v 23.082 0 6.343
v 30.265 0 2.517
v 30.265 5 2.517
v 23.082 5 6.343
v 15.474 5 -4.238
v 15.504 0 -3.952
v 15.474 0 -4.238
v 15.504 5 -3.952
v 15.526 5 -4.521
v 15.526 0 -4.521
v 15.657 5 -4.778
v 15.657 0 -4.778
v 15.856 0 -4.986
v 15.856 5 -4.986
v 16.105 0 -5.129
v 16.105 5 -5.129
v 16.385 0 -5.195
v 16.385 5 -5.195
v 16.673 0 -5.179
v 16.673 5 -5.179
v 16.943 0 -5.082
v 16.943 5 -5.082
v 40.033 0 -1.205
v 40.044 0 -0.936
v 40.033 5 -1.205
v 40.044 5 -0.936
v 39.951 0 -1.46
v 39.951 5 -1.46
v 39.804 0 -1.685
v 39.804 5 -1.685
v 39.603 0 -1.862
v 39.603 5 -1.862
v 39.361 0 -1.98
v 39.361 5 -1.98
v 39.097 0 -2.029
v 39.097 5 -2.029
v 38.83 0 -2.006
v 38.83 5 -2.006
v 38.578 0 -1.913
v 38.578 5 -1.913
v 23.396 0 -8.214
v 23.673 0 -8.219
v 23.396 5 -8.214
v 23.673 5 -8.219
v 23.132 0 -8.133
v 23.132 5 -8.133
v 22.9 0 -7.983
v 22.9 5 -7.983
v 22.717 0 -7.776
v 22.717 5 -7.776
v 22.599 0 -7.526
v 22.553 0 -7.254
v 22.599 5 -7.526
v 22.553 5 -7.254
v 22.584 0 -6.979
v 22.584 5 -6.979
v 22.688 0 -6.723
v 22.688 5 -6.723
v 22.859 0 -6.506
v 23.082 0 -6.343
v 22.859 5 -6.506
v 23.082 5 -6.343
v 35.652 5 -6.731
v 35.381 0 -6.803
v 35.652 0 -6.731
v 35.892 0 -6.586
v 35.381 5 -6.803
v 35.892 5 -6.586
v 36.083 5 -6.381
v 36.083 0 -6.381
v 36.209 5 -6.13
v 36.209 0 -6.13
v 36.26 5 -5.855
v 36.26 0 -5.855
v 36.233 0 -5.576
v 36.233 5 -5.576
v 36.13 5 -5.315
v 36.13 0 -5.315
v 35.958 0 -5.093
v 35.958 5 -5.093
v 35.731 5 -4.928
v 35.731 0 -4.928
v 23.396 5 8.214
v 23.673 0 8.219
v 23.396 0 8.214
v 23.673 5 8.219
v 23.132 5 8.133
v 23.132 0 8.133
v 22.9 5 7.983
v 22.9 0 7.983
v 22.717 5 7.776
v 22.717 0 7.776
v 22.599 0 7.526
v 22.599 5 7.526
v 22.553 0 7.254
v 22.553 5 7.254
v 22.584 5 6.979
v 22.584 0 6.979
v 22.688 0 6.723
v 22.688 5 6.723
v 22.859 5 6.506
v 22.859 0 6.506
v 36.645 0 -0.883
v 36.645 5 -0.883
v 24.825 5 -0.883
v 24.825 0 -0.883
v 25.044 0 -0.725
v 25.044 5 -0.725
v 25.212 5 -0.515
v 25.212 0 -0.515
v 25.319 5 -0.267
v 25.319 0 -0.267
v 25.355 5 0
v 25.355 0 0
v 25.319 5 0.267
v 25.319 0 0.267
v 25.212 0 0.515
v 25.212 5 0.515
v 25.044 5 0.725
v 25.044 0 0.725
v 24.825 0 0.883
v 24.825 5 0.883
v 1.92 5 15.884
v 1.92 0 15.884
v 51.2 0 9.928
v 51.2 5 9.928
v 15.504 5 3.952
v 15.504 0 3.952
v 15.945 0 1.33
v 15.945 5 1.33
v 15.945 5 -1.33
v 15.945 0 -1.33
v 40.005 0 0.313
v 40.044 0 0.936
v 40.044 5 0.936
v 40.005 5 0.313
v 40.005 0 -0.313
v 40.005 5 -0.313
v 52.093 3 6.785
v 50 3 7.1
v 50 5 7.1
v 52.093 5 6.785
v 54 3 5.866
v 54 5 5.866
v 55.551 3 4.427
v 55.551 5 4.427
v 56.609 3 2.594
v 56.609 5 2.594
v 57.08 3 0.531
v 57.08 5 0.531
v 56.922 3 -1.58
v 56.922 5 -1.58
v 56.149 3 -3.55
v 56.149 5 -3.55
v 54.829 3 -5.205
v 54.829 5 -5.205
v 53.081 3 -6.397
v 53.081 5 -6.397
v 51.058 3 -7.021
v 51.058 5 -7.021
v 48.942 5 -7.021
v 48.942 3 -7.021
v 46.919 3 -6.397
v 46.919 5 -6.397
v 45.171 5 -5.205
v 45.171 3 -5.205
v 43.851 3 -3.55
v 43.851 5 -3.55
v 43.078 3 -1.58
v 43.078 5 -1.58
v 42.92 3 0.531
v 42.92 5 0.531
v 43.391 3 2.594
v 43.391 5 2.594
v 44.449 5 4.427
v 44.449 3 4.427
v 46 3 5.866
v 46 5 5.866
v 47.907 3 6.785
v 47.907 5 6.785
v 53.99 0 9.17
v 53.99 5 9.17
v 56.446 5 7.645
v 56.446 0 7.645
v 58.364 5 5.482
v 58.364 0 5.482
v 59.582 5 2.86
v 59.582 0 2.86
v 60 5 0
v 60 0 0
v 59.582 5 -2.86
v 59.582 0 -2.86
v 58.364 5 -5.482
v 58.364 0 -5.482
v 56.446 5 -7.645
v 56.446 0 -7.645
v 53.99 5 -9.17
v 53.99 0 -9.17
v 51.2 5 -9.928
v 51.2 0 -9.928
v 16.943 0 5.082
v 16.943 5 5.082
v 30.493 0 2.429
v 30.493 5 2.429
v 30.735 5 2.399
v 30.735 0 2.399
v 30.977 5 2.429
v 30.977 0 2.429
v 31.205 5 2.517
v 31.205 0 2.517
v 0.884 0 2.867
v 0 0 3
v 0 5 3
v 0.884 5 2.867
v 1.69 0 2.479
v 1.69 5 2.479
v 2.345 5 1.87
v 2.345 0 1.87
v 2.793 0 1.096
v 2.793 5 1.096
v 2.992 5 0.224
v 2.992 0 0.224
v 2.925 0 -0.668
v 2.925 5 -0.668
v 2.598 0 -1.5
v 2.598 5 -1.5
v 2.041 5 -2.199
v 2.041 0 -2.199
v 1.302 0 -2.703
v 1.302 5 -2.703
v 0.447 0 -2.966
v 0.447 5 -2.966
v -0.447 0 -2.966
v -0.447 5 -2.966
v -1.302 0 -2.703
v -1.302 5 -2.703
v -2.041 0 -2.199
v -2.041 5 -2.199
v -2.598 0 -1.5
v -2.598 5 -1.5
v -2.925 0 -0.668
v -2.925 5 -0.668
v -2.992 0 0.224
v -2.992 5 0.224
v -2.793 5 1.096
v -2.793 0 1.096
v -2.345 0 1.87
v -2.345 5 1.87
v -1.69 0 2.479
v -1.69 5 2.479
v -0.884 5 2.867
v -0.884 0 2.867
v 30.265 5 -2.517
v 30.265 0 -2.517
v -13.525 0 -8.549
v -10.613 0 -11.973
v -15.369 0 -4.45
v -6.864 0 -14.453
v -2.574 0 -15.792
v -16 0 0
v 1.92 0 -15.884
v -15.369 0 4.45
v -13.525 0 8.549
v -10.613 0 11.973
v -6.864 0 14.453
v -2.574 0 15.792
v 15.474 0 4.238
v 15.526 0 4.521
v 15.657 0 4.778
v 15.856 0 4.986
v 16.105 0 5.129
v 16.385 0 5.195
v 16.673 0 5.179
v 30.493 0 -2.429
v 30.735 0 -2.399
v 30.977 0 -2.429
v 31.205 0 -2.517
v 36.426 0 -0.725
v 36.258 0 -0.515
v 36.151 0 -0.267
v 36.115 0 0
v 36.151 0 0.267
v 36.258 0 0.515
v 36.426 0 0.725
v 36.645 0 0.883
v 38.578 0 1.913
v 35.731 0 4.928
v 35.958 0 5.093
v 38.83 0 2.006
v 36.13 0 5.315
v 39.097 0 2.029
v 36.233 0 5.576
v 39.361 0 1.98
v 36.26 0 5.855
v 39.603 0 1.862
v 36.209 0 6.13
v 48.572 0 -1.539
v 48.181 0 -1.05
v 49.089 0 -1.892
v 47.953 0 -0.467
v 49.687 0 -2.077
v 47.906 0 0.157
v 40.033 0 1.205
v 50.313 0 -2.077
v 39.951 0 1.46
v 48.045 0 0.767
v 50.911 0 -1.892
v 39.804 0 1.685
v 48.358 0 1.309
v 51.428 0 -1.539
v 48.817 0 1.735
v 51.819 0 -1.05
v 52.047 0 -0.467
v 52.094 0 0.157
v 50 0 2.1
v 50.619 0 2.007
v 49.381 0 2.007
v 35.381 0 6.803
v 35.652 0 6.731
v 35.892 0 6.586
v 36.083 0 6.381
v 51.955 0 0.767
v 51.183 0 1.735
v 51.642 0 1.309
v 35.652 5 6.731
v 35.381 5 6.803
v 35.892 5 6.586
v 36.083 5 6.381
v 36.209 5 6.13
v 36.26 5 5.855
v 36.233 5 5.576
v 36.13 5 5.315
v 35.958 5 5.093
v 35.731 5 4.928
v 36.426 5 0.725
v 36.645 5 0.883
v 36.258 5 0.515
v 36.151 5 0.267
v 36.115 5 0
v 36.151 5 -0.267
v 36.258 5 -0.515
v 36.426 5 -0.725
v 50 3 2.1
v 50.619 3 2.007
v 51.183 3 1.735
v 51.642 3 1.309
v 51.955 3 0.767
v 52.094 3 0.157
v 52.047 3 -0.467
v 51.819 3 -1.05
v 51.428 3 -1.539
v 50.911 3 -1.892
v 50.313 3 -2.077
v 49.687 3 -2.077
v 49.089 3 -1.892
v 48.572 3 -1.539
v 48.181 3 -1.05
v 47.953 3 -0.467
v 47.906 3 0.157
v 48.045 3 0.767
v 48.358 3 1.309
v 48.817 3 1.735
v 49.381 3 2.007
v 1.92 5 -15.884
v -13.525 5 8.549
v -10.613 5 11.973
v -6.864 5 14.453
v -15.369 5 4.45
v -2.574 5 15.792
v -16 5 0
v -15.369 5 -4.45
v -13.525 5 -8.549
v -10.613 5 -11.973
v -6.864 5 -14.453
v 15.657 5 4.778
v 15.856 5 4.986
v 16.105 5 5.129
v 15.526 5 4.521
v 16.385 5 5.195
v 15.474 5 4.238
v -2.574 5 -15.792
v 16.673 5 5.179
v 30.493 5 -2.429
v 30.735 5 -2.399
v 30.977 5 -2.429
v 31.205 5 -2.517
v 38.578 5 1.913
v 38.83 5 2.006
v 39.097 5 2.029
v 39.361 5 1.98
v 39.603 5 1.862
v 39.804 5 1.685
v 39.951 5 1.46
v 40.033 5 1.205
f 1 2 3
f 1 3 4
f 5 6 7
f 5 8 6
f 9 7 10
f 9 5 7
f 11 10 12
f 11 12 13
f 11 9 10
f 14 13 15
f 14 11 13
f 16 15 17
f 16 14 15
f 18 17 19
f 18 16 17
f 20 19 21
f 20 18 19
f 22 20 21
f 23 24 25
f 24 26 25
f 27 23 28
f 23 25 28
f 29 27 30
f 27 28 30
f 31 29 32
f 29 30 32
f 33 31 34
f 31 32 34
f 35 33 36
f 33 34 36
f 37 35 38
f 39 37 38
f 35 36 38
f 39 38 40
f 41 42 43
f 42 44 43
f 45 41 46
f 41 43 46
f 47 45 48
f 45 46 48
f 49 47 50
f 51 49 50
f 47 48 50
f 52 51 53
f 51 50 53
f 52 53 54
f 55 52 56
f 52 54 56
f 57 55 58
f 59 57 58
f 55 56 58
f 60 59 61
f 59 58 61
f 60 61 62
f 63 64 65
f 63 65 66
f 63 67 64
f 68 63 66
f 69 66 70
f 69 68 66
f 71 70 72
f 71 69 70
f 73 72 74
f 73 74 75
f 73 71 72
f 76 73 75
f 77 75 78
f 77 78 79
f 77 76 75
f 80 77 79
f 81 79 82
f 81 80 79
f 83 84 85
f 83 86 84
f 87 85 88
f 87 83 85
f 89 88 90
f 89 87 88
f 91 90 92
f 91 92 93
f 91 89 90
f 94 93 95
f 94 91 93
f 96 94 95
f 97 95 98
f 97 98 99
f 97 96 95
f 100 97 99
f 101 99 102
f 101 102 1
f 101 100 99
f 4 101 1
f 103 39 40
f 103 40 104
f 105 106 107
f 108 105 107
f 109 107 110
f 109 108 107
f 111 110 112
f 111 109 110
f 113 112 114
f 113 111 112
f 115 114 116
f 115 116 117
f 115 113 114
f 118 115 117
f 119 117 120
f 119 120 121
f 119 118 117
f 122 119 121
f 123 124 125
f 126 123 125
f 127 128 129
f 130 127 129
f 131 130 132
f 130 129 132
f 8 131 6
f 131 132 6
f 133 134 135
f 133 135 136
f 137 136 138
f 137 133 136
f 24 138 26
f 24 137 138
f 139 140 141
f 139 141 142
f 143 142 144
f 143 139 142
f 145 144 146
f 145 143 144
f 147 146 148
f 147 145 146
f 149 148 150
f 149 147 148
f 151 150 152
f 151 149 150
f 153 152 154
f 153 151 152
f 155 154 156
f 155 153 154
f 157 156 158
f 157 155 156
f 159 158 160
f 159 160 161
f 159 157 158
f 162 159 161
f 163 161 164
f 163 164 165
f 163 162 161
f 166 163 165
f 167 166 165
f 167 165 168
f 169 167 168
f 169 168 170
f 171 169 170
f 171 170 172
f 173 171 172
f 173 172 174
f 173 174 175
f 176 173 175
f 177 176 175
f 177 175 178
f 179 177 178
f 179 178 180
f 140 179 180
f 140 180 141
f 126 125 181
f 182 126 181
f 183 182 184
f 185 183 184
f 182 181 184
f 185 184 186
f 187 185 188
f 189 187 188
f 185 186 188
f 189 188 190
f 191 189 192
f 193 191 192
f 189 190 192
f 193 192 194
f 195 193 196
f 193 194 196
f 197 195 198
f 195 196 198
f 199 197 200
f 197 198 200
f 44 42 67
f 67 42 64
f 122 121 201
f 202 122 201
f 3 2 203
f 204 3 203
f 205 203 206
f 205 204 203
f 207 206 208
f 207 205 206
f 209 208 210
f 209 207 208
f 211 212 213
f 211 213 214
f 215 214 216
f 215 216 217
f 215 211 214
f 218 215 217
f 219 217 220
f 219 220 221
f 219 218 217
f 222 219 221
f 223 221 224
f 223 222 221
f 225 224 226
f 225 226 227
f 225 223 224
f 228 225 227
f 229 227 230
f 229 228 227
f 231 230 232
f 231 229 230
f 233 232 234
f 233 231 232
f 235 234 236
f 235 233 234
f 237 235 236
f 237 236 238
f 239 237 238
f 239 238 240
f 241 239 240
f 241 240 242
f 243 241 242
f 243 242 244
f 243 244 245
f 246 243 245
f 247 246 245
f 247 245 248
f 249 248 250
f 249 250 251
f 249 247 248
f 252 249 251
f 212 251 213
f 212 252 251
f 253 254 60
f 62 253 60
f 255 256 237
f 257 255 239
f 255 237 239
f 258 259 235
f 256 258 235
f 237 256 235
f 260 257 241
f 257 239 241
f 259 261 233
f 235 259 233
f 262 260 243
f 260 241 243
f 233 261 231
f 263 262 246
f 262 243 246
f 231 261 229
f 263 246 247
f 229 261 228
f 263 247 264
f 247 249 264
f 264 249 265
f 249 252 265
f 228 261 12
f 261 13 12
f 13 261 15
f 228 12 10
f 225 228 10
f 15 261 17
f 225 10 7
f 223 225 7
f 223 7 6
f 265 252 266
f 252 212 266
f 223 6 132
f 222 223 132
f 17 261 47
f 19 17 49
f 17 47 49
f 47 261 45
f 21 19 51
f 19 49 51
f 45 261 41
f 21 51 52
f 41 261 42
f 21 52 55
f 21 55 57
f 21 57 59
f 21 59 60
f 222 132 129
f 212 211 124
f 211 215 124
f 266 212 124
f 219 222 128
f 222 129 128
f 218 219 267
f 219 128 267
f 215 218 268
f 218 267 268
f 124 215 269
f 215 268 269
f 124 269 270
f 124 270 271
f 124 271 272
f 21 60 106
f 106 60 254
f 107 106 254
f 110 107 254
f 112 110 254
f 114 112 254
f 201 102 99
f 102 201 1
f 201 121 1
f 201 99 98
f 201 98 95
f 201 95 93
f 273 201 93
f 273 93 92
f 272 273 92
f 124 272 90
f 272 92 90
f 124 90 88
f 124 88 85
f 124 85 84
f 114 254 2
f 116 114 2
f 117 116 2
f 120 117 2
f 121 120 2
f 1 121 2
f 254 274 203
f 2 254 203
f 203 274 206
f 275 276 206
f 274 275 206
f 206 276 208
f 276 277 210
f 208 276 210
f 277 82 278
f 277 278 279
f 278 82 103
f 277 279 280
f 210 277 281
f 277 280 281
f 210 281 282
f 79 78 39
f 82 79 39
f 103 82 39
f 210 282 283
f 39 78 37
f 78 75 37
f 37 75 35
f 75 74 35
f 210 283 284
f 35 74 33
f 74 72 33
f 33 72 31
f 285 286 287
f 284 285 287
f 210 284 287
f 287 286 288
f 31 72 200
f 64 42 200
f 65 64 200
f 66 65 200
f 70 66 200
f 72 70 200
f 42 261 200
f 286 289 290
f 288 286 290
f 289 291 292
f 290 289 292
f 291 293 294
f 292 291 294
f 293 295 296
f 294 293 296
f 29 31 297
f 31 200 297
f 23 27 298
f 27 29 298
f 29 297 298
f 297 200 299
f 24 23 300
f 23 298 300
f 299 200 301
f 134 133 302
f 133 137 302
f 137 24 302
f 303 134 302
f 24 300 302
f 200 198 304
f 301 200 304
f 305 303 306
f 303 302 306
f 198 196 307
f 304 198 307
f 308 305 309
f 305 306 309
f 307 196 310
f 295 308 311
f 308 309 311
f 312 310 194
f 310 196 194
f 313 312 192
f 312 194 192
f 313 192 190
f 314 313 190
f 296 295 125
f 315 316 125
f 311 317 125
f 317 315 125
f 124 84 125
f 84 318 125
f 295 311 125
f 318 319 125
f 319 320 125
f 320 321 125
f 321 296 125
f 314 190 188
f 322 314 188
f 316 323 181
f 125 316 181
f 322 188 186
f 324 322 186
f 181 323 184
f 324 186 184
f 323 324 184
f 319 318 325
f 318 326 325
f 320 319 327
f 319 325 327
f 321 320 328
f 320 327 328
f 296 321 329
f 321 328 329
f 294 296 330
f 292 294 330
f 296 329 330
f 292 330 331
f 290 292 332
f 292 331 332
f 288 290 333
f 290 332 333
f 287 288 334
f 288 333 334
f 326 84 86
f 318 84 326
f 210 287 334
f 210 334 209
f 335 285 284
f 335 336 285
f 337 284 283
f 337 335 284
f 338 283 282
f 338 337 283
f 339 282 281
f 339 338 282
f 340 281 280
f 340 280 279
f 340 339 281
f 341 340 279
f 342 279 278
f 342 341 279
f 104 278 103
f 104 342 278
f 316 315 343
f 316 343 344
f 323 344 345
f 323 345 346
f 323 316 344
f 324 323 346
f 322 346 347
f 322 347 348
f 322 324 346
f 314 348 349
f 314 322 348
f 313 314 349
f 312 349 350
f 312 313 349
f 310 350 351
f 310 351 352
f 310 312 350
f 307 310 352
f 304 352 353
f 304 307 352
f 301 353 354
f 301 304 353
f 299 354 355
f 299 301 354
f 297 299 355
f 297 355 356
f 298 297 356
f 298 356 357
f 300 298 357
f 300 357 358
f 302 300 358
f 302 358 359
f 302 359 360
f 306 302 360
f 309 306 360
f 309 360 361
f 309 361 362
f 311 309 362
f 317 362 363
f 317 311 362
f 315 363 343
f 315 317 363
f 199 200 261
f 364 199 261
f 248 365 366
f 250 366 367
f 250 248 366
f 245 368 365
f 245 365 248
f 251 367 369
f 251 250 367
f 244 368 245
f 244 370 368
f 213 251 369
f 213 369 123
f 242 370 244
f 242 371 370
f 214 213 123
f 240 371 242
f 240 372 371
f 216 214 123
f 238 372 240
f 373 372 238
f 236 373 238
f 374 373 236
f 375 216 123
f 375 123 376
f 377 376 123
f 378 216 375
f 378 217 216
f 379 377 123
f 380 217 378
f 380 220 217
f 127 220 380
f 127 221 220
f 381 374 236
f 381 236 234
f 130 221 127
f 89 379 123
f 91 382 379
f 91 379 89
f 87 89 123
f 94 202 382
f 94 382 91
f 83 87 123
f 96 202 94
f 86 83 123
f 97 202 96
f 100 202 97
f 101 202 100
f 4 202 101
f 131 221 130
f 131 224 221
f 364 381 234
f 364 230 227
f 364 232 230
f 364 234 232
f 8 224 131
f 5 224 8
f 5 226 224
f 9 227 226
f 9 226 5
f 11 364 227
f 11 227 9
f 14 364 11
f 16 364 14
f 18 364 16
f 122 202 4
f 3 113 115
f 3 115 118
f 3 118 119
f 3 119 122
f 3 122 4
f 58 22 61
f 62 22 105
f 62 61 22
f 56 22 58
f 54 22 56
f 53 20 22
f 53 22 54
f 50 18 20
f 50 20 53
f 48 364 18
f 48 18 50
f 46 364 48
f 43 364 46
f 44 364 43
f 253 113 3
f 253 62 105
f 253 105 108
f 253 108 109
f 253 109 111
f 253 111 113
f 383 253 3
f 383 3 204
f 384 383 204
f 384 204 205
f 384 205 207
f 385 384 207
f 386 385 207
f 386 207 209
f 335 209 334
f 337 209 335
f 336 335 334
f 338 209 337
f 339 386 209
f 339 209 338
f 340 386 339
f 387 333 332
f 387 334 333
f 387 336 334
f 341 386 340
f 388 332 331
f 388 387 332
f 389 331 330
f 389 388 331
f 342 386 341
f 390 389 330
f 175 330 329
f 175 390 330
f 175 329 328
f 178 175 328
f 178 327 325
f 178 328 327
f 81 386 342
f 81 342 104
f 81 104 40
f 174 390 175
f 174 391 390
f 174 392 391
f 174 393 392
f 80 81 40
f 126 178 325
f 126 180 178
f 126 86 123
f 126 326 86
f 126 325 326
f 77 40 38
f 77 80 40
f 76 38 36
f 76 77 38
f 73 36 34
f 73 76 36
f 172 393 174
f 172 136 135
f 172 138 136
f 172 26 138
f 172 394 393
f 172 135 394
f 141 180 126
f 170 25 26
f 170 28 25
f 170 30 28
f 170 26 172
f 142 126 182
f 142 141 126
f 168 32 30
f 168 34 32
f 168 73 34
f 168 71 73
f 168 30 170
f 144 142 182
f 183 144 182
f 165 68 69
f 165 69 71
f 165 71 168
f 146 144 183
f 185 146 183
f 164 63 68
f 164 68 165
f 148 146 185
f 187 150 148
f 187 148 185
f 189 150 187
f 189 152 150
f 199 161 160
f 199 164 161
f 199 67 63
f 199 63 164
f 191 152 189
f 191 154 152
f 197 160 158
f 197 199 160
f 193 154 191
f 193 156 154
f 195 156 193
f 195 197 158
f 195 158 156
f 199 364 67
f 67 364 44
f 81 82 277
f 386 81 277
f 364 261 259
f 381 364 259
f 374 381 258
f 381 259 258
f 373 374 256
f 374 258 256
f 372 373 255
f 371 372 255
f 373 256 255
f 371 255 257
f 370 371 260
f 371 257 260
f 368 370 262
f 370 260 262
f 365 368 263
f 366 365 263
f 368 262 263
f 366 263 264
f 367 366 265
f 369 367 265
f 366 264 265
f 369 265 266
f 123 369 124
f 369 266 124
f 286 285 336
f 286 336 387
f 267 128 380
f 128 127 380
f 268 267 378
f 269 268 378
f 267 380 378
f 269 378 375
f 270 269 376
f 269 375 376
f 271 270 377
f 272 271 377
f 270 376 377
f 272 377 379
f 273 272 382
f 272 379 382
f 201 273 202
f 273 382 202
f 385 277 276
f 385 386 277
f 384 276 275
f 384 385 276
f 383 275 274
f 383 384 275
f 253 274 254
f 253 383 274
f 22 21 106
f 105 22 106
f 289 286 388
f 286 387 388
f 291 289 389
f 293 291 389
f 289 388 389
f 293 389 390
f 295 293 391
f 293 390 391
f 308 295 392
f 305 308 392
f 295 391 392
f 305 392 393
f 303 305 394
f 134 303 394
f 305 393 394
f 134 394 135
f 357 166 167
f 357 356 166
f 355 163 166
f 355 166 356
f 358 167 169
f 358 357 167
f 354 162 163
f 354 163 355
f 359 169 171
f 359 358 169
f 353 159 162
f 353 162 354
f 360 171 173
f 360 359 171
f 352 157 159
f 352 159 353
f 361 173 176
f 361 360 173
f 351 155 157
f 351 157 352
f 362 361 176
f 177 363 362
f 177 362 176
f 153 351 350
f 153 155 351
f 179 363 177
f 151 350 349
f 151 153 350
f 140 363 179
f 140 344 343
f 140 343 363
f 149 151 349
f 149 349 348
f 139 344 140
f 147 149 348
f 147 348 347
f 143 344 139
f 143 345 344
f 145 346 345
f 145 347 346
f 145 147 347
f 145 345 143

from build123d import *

# Parameters (mm, degrees)
SKETCH_1_R      = 3
SKETCH_1_R_2    = 7.1
EXTRUDE_1_DEPTH = 5
SKETCH_1_3_R    = 7.1
SKETCH_1_3_R_2  = 2.1
EXTRUDE_2_DEPTH = 3
FILLET_1_R      = 1
FILLET_2_R      = 1
FILLET_3_R      = 1
FILLET_4_R      = 1


with BuildPart() as part:
    # 草图1 → 凸台-拉伸1 (new body)
    with BuildSketch(Plane(origin=(0, 0, 0), x_dir=(1, 0, 0), z_dir=(0, 1, 0))):
        with BuildLine():
            ThreePointArc((1.92, 15.884382267), (-16, 0), (1.92, -15.884382267))
            Line((1.92, -15.884382267), (51.2, -9.927738917))
            ThreePointArc((51.2, -9.927738917), (60, 0), (51.2, 9.927738917))
            Line((51.2, 9.927738917), (1.92, 15.884382267))
        make_face()
        Circle(SKETCH_1_R, mode=Mode.SUBTRACT)
        Polygon((38.535462938, -6.422151611), (18.356508588, -8.861251331), (30.734984007, -2.266153232), align=None, mode=Mode.SUBTRACT)
        with BuildLine():
            Line((40.429404433, -2.898913674), (34.988373668, 0))
            Line((34.988373668, 0), (40.429404433, 2.898913674))
            ThreePointArc((40.429404433, 2.898913674), (40, 0), (40.429404433, -2.898913674))
        make_face(mode=Mode.SUBTRACT)
        with Locations((50, 0)):
            Circle(SKETCH_1_R_2, mode=Mode.SUBTRACT)
        with BuildLine():
            ThreePointArc((14.72234722, -6.265180949), (16, 0), (14.72234722, 6.265180949))
            Line((14.72234722, 6.265180949), (26.481594346, 0))
            Line((26.481594346, 0), (14.72234722, -6.265180949))
        make_face(mode=Mode.SUBTRACT)
        Polygon((30.734984007, 2.266153232), (18.356508588, 8.861251331), (38.535462938, 6.422151611), align=None, mode=Mode.SUBTRACT)
    extrude(amount=EXTRUDE_1_DEPTH)

    # 草图1<3> → 凸台-拉伸2 (add)
    with BuildSketch(Plane(origin=(0, 0, 0), x_dir=(1, 0, 0), z_dir=(0, 1, 0))):
        with Locations((50, 0)):
            Circle(SKETCH_1_3_R)
        with Locations((50, 0)):
            Circle(SKETCH_1_3_R_2, mode=Mode.SUBTRACT)
    extrude(amount=EXTRUDE_2_DEPTH)

    # 圆角1
    fillet_1_edges = [part.edges().sort_by_distance(p)[0] for p in [
        (34.988373668, 2.5, 0),
        (40.429404433, 2.5, -2.898913674),
        (40.429404433, 2.5, 2.898913674),
    ]]
    fillet(fillet_1_edges, radius=FILLET_1_R)

    # 圆角2
    fillet_2_edges = [part.edges().sort_by_distance(p)[0] for p in [
        (30.734984007, 2.5, 2.266153232),
        (18.356508588, 2.5, 8.861251331),
        (38.535462938, 2.5, 6.422151611),
    ]]
    fillet(fillet_2_edges, radius=FILLET_2_R)

    # 圆角3
    fillet_3_edges = [part.edges().sort_by_distance(p)[0] for p in [
        (18.356508588, 2.5, -8.861251331),
        (30.734984007, 2.5, -2.266153232),
        (38.535462938, 2.5, -6.422151611),
    ]]
    fillet(fillet_3_edges, radius=FILLET_3_R)

    # 圆角4
    fillet_4_edges = [part.edges().sort_by_distance(p)[0] for p in [
        (14.72234722, 2.5, -6.265180949),
        (26.481594346, 2.5, 0),
        (14.72234722, 2.5, 6.265180949),
    ]]
    fillet(fillet_4_edges, radius=FILLET_4_R)


solid = part.part
